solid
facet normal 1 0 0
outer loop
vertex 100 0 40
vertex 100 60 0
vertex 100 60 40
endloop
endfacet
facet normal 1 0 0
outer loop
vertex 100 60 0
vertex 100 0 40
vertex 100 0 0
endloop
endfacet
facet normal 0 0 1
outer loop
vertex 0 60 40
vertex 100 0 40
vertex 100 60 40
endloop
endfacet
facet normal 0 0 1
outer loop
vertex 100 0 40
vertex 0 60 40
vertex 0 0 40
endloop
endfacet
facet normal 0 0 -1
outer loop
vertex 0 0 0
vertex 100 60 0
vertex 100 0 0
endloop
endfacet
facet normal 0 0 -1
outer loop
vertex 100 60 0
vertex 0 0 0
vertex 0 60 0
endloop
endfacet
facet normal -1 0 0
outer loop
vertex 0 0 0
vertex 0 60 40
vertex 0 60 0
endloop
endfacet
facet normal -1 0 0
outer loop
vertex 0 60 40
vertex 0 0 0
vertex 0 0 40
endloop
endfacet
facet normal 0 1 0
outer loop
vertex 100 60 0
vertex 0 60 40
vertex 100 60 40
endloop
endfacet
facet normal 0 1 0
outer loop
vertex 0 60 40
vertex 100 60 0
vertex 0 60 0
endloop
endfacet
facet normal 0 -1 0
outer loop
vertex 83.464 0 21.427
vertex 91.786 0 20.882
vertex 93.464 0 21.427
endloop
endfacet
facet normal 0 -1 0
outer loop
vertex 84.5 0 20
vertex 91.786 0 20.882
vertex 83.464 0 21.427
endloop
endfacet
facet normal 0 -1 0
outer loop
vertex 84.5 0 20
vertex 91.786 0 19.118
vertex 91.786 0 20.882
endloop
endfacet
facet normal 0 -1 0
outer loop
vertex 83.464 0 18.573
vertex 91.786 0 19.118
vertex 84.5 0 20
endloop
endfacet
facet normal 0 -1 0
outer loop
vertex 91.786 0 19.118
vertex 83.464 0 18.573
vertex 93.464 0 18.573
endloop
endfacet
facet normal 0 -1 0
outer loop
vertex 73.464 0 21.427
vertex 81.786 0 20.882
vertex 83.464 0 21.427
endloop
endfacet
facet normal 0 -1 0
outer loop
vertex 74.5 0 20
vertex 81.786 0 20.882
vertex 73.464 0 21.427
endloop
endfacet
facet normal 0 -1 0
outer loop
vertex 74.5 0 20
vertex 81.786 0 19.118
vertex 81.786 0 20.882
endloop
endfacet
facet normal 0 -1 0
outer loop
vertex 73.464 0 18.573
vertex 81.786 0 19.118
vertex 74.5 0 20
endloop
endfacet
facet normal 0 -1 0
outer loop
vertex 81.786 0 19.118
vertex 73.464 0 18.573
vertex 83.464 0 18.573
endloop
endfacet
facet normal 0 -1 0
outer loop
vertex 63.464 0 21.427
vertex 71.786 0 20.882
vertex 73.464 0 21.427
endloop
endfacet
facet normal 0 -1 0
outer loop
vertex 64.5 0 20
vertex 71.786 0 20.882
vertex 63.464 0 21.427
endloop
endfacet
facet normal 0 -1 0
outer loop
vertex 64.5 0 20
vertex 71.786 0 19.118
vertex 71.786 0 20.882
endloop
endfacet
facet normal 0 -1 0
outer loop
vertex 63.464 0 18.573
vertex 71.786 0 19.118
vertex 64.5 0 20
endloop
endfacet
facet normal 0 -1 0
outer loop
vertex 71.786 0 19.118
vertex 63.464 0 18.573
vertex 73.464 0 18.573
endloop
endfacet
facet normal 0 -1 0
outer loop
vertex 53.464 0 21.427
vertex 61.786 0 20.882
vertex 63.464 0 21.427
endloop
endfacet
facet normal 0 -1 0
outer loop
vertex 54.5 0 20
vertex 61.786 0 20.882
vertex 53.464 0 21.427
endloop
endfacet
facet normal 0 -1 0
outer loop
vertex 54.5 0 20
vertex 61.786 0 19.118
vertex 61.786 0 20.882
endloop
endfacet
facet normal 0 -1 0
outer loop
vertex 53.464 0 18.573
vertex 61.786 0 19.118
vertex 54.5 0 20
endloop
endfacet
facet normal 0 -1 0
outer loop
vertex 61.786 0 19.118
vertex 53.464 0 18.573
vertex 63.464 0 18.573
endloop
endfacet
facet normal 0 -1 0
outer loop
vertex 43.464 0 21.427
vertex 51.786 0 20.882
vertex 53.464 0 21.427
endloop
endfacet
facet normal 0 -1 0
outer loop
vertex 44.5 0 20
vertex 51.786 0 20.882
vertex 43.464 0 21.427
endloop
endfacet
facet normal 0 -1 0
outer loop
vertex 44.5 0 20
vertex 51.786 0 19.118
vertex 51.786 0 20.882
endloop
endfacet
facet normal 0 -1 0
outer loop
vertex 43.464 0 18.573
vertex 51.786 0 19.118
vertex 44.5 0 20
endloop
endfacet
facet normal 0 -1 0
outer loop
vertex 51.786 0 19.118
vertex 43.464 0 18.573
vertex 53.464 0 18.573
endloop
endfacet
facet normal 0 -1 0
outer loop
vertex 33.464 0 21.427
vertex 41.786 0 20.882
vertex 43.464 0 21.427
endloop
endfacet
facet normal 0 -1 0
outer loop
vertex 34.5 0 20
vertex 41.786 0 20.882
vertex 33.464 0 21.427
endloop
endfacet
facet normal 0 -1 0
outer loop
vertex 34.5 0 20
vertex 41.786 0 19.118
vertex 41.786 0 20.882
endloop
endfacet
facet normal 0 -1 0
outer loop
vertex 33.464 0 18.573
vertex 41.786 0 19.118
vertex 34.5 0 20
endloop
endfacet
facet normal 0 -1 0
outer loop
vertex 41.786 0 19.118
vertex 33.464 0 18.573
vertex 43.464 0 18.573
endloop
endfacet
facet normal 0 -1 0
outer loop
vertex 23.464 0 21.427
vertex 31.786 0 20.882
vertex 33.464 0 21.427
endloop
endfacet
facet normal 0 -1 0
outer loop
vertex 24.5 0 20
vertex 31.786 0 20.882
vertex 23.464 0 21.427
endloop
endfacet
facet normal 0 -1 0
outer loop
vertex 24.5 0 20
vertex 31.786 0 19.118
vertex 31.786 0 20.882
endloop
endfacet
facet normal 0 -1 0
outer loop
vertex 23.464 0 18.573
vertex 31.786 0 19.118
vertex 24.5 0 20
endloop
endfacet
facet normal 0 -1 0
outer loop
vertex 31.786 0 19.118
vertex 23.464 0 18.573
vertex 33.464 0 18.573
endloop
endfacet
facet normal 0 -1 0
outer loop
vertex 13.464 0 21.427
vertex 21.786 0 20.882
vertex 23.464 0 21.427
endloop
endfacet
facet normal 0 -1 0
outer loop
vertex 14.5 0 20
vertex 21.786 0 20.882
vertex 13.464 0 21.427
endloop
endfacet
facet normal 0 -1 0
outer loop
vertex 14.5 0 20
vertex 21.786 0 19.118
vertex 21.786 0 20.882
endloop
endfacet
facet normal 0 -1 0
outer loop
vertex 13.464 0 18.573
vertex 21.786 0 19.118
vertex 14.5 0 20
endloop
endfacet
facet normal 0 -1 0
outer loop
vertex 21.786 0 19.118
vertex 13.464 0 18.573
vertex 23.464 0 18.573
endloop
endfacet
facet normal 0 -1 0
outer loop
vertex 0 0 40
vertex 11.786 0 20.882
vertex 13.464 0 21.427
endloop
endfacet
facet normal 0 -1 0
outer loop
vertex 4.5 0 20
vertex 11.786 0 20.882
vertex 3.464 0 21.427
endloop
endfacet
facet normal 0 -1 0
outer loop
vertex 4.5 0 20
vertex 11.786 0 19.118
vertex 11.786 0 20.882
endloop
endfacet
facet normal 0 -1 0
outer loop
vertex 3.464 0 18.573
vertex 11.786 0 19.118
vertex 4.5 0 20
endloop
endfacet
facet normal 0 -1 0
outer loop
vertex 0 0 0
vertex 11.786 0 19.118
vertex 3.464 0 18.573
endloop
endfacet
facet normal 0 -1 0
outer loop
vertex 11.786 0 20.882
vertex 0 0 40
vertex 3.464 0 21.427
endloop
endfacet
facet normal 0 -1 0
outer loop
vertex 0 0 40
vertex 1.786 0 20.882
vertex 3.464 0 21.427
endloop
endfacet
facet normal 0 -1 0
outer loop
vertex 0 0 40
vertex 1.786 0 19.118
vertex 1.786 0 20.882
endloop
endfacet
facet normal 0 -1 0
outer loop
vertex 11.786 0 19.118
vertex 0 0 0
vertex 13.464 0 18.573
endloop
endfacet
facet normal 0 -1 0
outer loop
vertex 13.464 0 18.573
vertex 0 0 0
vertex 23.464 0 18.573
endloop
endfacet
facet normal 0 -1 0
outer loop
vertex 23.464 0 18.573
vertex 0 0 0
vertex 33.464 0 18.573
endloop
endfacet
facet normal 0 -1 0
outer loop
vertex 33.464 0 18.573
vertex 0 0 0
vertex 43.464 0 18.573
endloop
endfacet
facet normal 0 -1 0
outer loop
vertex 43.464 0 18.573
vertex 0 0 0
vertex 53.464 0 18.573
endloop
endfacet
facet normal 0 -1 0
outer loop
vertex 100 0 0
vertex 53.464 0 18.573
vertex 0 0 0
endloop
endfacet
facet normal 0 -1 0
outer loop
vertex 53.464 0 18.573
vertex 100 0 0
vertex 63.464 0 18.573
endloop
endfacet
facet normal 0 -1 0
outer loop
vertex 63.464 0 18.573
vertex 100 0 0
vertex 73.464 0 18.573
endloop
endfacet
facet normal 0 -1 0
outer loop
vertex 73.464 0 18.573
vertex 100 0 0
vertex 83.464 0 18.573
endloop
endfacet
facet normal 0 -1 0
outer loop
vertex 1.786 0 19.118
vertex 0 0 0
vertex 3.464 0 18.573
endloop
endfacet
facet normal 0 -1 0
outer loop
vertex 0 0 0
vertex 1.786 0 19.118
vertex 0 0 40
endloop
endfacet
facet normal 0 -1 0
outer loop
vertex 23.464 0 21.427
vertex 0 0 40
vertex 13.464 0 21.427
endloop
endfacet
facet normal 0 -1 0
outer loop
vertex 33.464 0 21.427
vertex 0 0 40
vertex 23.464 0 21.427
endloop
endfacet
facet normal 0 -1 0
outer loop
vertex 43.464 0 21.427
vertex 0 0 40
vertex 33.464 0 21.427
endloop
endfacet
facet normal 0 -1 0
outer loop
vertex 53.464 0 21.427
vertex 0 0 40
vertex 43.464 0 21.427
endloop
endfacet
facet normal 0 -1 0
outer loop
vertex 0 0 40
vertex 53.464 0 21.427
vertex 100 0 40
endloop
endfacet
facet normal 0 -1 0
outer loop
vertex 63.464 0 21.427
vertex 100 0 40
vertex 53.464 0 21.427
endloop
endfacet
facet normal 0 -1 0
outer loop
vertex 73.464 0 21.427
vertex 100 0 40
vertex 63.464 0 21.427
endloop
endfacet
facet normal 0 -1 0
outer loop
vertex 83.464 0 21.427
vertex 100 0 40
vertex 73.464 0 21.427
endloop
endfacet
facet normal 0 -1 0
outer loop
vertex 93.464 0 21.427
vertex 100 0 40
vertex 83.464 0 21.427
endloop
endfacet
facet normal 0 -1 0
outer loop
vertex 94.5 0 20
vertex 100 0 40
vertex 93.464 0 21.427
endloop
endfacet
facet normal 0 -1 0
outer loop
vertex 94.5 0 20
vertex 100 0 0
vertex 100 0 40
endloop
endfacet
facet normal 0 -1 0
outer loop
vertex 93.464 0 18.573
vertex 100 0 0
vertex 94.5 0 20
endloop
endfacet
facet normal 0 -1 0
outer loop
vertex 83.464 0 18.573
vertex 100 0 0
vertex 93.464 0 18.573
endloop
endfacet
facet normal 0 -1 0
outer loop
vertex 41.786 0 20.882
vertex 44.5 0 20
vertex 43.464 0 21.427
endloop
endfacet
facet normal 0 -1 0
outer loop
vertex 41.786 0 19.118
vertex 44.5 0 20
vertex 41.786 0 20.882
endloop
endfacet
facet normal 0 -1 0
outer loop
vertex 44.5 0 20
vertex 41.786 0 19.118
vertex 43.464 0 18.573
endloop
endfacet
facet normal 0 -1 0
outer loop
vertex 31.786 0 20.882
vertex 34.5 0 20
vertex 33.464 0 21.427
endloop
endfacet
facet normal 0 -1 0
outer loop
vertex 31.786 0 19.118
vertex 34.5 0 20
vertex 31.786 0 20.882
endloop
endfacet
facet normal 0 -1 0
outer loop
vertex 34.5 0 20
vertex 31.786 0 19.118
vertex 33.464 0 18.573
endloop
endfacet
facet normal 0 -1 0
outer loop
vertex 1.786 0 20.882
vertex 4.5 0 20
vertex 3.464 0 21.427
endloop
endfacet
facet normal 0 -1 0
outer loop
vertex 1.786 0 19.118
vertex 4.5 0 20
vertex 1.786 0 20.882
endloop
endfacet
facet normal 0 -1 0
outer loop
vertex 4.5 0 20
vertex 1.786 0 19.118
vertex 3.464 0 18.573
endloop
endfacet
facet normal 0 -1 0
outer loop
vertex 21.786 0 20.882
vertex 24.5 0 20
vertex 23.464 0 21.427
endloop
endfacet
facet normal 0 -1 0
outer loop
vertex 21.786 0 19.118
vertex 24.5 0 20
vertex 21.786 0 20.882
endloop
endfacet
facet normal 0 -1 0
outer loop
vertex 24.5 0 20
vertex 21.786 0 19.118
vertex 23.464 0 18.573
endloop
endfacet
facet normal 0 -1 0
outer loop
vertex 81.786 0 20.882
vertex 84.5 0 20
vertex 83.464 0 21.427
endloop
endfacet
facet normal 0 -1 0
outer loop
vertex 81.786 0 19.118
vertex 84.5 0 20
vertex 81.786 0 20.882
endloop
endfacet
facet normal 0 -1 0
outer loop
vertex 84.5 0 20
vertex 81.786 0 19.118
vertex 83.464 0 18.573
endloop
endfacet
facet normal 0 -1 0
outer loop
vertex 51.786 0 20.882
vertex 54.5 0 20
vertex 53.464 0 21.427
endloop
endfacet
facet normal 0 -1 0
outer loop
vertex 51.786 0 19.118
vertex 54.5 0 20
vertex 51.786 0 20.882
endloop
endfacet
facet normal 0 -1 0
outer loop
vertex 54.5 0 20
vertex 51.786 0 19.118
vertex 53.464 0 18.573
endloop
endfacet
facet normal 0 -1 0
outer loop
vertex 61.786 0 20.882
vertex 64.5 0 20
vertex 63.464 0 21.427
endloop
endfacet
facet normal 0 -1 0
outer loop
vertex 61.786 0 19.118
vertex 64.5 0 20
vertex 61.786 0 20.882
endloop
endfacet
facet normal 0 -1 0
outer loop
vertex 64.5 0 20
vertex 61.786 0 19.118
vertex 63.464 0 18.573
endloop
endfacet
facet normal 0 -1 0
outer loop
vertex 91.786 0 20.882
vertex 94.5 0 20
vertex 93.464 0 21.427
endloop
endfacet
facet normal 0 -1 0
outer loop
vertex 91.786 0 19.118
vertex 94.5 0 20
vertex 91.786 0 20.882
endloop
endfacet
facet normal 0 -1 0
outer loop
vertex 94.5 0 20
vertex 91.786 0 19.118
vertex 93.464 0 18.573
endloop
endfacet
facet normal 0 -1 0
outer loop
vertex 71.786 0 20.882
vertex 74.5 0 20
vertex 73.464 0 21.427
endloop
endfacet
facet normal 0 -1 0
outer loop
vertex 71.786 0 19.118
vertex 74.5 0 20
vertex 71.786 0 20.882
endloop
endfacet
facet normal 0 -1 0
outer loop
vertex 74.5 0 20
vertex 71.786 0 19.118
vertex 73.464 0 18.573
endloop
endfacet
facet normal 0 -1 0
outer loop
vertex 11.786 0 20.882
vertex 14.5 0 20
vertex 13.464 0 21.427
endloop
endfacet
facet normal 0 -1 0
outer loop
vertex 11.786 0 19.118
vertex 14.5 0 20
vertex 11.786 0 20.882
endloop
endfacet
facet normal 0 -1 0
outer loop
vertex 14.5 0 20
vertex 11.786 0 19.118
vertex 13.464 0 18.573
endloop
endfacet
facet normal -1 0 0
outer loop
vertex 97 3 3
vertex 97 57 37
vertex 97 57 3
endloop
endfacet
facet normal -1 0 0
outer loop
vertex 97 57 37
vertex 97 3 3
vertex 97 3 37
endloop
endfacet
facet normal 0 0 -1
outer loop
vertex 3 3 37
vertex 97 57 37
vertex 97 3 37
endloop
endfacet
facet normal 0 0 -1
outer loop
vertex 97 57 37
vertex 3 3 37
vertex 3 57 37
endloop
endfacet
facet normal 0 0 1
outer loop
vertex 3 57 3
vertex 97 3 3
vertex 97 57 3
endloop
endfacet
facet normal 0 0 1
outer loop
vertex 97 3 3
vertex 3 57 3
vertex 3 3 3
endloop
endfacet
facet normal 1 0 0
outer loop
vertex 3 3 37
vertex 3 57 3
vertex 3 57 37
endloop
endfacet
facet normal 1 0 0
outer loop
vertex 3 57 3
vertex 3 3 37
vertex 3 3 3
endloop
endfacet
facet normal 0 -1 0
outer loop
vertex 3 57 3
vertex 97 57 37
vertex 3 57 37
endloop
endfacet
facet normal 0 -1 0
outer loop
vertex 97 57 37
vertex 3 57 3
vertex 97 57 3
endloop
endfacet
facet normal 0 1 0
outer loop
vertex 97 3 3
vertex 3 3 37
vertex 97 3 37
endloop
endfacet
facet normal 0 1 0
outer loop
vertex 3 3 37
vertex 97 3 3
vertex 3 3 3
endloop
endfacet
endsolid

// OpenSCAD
// Advanced Parametric Vented Box
length = 100;
width = 60;
height = 40;
wall = 3;
vent_spacing = 10;

module box_shell() {
    difference() {
        cube([length, width, height]);
        translate([wall, wall, wall])
            cube([length - 2*wall, width - 2*wall, height - 2*wall]);
    }
}

module vents() {
    for (x = [wall : vent_spacing : length - wall]) {
        translate([x, 0, height/2])
            rotate([90,0,0])
                cylinder(h=width, d=3);
    }
}

difference() {
    box_shell();
    vents();
}
